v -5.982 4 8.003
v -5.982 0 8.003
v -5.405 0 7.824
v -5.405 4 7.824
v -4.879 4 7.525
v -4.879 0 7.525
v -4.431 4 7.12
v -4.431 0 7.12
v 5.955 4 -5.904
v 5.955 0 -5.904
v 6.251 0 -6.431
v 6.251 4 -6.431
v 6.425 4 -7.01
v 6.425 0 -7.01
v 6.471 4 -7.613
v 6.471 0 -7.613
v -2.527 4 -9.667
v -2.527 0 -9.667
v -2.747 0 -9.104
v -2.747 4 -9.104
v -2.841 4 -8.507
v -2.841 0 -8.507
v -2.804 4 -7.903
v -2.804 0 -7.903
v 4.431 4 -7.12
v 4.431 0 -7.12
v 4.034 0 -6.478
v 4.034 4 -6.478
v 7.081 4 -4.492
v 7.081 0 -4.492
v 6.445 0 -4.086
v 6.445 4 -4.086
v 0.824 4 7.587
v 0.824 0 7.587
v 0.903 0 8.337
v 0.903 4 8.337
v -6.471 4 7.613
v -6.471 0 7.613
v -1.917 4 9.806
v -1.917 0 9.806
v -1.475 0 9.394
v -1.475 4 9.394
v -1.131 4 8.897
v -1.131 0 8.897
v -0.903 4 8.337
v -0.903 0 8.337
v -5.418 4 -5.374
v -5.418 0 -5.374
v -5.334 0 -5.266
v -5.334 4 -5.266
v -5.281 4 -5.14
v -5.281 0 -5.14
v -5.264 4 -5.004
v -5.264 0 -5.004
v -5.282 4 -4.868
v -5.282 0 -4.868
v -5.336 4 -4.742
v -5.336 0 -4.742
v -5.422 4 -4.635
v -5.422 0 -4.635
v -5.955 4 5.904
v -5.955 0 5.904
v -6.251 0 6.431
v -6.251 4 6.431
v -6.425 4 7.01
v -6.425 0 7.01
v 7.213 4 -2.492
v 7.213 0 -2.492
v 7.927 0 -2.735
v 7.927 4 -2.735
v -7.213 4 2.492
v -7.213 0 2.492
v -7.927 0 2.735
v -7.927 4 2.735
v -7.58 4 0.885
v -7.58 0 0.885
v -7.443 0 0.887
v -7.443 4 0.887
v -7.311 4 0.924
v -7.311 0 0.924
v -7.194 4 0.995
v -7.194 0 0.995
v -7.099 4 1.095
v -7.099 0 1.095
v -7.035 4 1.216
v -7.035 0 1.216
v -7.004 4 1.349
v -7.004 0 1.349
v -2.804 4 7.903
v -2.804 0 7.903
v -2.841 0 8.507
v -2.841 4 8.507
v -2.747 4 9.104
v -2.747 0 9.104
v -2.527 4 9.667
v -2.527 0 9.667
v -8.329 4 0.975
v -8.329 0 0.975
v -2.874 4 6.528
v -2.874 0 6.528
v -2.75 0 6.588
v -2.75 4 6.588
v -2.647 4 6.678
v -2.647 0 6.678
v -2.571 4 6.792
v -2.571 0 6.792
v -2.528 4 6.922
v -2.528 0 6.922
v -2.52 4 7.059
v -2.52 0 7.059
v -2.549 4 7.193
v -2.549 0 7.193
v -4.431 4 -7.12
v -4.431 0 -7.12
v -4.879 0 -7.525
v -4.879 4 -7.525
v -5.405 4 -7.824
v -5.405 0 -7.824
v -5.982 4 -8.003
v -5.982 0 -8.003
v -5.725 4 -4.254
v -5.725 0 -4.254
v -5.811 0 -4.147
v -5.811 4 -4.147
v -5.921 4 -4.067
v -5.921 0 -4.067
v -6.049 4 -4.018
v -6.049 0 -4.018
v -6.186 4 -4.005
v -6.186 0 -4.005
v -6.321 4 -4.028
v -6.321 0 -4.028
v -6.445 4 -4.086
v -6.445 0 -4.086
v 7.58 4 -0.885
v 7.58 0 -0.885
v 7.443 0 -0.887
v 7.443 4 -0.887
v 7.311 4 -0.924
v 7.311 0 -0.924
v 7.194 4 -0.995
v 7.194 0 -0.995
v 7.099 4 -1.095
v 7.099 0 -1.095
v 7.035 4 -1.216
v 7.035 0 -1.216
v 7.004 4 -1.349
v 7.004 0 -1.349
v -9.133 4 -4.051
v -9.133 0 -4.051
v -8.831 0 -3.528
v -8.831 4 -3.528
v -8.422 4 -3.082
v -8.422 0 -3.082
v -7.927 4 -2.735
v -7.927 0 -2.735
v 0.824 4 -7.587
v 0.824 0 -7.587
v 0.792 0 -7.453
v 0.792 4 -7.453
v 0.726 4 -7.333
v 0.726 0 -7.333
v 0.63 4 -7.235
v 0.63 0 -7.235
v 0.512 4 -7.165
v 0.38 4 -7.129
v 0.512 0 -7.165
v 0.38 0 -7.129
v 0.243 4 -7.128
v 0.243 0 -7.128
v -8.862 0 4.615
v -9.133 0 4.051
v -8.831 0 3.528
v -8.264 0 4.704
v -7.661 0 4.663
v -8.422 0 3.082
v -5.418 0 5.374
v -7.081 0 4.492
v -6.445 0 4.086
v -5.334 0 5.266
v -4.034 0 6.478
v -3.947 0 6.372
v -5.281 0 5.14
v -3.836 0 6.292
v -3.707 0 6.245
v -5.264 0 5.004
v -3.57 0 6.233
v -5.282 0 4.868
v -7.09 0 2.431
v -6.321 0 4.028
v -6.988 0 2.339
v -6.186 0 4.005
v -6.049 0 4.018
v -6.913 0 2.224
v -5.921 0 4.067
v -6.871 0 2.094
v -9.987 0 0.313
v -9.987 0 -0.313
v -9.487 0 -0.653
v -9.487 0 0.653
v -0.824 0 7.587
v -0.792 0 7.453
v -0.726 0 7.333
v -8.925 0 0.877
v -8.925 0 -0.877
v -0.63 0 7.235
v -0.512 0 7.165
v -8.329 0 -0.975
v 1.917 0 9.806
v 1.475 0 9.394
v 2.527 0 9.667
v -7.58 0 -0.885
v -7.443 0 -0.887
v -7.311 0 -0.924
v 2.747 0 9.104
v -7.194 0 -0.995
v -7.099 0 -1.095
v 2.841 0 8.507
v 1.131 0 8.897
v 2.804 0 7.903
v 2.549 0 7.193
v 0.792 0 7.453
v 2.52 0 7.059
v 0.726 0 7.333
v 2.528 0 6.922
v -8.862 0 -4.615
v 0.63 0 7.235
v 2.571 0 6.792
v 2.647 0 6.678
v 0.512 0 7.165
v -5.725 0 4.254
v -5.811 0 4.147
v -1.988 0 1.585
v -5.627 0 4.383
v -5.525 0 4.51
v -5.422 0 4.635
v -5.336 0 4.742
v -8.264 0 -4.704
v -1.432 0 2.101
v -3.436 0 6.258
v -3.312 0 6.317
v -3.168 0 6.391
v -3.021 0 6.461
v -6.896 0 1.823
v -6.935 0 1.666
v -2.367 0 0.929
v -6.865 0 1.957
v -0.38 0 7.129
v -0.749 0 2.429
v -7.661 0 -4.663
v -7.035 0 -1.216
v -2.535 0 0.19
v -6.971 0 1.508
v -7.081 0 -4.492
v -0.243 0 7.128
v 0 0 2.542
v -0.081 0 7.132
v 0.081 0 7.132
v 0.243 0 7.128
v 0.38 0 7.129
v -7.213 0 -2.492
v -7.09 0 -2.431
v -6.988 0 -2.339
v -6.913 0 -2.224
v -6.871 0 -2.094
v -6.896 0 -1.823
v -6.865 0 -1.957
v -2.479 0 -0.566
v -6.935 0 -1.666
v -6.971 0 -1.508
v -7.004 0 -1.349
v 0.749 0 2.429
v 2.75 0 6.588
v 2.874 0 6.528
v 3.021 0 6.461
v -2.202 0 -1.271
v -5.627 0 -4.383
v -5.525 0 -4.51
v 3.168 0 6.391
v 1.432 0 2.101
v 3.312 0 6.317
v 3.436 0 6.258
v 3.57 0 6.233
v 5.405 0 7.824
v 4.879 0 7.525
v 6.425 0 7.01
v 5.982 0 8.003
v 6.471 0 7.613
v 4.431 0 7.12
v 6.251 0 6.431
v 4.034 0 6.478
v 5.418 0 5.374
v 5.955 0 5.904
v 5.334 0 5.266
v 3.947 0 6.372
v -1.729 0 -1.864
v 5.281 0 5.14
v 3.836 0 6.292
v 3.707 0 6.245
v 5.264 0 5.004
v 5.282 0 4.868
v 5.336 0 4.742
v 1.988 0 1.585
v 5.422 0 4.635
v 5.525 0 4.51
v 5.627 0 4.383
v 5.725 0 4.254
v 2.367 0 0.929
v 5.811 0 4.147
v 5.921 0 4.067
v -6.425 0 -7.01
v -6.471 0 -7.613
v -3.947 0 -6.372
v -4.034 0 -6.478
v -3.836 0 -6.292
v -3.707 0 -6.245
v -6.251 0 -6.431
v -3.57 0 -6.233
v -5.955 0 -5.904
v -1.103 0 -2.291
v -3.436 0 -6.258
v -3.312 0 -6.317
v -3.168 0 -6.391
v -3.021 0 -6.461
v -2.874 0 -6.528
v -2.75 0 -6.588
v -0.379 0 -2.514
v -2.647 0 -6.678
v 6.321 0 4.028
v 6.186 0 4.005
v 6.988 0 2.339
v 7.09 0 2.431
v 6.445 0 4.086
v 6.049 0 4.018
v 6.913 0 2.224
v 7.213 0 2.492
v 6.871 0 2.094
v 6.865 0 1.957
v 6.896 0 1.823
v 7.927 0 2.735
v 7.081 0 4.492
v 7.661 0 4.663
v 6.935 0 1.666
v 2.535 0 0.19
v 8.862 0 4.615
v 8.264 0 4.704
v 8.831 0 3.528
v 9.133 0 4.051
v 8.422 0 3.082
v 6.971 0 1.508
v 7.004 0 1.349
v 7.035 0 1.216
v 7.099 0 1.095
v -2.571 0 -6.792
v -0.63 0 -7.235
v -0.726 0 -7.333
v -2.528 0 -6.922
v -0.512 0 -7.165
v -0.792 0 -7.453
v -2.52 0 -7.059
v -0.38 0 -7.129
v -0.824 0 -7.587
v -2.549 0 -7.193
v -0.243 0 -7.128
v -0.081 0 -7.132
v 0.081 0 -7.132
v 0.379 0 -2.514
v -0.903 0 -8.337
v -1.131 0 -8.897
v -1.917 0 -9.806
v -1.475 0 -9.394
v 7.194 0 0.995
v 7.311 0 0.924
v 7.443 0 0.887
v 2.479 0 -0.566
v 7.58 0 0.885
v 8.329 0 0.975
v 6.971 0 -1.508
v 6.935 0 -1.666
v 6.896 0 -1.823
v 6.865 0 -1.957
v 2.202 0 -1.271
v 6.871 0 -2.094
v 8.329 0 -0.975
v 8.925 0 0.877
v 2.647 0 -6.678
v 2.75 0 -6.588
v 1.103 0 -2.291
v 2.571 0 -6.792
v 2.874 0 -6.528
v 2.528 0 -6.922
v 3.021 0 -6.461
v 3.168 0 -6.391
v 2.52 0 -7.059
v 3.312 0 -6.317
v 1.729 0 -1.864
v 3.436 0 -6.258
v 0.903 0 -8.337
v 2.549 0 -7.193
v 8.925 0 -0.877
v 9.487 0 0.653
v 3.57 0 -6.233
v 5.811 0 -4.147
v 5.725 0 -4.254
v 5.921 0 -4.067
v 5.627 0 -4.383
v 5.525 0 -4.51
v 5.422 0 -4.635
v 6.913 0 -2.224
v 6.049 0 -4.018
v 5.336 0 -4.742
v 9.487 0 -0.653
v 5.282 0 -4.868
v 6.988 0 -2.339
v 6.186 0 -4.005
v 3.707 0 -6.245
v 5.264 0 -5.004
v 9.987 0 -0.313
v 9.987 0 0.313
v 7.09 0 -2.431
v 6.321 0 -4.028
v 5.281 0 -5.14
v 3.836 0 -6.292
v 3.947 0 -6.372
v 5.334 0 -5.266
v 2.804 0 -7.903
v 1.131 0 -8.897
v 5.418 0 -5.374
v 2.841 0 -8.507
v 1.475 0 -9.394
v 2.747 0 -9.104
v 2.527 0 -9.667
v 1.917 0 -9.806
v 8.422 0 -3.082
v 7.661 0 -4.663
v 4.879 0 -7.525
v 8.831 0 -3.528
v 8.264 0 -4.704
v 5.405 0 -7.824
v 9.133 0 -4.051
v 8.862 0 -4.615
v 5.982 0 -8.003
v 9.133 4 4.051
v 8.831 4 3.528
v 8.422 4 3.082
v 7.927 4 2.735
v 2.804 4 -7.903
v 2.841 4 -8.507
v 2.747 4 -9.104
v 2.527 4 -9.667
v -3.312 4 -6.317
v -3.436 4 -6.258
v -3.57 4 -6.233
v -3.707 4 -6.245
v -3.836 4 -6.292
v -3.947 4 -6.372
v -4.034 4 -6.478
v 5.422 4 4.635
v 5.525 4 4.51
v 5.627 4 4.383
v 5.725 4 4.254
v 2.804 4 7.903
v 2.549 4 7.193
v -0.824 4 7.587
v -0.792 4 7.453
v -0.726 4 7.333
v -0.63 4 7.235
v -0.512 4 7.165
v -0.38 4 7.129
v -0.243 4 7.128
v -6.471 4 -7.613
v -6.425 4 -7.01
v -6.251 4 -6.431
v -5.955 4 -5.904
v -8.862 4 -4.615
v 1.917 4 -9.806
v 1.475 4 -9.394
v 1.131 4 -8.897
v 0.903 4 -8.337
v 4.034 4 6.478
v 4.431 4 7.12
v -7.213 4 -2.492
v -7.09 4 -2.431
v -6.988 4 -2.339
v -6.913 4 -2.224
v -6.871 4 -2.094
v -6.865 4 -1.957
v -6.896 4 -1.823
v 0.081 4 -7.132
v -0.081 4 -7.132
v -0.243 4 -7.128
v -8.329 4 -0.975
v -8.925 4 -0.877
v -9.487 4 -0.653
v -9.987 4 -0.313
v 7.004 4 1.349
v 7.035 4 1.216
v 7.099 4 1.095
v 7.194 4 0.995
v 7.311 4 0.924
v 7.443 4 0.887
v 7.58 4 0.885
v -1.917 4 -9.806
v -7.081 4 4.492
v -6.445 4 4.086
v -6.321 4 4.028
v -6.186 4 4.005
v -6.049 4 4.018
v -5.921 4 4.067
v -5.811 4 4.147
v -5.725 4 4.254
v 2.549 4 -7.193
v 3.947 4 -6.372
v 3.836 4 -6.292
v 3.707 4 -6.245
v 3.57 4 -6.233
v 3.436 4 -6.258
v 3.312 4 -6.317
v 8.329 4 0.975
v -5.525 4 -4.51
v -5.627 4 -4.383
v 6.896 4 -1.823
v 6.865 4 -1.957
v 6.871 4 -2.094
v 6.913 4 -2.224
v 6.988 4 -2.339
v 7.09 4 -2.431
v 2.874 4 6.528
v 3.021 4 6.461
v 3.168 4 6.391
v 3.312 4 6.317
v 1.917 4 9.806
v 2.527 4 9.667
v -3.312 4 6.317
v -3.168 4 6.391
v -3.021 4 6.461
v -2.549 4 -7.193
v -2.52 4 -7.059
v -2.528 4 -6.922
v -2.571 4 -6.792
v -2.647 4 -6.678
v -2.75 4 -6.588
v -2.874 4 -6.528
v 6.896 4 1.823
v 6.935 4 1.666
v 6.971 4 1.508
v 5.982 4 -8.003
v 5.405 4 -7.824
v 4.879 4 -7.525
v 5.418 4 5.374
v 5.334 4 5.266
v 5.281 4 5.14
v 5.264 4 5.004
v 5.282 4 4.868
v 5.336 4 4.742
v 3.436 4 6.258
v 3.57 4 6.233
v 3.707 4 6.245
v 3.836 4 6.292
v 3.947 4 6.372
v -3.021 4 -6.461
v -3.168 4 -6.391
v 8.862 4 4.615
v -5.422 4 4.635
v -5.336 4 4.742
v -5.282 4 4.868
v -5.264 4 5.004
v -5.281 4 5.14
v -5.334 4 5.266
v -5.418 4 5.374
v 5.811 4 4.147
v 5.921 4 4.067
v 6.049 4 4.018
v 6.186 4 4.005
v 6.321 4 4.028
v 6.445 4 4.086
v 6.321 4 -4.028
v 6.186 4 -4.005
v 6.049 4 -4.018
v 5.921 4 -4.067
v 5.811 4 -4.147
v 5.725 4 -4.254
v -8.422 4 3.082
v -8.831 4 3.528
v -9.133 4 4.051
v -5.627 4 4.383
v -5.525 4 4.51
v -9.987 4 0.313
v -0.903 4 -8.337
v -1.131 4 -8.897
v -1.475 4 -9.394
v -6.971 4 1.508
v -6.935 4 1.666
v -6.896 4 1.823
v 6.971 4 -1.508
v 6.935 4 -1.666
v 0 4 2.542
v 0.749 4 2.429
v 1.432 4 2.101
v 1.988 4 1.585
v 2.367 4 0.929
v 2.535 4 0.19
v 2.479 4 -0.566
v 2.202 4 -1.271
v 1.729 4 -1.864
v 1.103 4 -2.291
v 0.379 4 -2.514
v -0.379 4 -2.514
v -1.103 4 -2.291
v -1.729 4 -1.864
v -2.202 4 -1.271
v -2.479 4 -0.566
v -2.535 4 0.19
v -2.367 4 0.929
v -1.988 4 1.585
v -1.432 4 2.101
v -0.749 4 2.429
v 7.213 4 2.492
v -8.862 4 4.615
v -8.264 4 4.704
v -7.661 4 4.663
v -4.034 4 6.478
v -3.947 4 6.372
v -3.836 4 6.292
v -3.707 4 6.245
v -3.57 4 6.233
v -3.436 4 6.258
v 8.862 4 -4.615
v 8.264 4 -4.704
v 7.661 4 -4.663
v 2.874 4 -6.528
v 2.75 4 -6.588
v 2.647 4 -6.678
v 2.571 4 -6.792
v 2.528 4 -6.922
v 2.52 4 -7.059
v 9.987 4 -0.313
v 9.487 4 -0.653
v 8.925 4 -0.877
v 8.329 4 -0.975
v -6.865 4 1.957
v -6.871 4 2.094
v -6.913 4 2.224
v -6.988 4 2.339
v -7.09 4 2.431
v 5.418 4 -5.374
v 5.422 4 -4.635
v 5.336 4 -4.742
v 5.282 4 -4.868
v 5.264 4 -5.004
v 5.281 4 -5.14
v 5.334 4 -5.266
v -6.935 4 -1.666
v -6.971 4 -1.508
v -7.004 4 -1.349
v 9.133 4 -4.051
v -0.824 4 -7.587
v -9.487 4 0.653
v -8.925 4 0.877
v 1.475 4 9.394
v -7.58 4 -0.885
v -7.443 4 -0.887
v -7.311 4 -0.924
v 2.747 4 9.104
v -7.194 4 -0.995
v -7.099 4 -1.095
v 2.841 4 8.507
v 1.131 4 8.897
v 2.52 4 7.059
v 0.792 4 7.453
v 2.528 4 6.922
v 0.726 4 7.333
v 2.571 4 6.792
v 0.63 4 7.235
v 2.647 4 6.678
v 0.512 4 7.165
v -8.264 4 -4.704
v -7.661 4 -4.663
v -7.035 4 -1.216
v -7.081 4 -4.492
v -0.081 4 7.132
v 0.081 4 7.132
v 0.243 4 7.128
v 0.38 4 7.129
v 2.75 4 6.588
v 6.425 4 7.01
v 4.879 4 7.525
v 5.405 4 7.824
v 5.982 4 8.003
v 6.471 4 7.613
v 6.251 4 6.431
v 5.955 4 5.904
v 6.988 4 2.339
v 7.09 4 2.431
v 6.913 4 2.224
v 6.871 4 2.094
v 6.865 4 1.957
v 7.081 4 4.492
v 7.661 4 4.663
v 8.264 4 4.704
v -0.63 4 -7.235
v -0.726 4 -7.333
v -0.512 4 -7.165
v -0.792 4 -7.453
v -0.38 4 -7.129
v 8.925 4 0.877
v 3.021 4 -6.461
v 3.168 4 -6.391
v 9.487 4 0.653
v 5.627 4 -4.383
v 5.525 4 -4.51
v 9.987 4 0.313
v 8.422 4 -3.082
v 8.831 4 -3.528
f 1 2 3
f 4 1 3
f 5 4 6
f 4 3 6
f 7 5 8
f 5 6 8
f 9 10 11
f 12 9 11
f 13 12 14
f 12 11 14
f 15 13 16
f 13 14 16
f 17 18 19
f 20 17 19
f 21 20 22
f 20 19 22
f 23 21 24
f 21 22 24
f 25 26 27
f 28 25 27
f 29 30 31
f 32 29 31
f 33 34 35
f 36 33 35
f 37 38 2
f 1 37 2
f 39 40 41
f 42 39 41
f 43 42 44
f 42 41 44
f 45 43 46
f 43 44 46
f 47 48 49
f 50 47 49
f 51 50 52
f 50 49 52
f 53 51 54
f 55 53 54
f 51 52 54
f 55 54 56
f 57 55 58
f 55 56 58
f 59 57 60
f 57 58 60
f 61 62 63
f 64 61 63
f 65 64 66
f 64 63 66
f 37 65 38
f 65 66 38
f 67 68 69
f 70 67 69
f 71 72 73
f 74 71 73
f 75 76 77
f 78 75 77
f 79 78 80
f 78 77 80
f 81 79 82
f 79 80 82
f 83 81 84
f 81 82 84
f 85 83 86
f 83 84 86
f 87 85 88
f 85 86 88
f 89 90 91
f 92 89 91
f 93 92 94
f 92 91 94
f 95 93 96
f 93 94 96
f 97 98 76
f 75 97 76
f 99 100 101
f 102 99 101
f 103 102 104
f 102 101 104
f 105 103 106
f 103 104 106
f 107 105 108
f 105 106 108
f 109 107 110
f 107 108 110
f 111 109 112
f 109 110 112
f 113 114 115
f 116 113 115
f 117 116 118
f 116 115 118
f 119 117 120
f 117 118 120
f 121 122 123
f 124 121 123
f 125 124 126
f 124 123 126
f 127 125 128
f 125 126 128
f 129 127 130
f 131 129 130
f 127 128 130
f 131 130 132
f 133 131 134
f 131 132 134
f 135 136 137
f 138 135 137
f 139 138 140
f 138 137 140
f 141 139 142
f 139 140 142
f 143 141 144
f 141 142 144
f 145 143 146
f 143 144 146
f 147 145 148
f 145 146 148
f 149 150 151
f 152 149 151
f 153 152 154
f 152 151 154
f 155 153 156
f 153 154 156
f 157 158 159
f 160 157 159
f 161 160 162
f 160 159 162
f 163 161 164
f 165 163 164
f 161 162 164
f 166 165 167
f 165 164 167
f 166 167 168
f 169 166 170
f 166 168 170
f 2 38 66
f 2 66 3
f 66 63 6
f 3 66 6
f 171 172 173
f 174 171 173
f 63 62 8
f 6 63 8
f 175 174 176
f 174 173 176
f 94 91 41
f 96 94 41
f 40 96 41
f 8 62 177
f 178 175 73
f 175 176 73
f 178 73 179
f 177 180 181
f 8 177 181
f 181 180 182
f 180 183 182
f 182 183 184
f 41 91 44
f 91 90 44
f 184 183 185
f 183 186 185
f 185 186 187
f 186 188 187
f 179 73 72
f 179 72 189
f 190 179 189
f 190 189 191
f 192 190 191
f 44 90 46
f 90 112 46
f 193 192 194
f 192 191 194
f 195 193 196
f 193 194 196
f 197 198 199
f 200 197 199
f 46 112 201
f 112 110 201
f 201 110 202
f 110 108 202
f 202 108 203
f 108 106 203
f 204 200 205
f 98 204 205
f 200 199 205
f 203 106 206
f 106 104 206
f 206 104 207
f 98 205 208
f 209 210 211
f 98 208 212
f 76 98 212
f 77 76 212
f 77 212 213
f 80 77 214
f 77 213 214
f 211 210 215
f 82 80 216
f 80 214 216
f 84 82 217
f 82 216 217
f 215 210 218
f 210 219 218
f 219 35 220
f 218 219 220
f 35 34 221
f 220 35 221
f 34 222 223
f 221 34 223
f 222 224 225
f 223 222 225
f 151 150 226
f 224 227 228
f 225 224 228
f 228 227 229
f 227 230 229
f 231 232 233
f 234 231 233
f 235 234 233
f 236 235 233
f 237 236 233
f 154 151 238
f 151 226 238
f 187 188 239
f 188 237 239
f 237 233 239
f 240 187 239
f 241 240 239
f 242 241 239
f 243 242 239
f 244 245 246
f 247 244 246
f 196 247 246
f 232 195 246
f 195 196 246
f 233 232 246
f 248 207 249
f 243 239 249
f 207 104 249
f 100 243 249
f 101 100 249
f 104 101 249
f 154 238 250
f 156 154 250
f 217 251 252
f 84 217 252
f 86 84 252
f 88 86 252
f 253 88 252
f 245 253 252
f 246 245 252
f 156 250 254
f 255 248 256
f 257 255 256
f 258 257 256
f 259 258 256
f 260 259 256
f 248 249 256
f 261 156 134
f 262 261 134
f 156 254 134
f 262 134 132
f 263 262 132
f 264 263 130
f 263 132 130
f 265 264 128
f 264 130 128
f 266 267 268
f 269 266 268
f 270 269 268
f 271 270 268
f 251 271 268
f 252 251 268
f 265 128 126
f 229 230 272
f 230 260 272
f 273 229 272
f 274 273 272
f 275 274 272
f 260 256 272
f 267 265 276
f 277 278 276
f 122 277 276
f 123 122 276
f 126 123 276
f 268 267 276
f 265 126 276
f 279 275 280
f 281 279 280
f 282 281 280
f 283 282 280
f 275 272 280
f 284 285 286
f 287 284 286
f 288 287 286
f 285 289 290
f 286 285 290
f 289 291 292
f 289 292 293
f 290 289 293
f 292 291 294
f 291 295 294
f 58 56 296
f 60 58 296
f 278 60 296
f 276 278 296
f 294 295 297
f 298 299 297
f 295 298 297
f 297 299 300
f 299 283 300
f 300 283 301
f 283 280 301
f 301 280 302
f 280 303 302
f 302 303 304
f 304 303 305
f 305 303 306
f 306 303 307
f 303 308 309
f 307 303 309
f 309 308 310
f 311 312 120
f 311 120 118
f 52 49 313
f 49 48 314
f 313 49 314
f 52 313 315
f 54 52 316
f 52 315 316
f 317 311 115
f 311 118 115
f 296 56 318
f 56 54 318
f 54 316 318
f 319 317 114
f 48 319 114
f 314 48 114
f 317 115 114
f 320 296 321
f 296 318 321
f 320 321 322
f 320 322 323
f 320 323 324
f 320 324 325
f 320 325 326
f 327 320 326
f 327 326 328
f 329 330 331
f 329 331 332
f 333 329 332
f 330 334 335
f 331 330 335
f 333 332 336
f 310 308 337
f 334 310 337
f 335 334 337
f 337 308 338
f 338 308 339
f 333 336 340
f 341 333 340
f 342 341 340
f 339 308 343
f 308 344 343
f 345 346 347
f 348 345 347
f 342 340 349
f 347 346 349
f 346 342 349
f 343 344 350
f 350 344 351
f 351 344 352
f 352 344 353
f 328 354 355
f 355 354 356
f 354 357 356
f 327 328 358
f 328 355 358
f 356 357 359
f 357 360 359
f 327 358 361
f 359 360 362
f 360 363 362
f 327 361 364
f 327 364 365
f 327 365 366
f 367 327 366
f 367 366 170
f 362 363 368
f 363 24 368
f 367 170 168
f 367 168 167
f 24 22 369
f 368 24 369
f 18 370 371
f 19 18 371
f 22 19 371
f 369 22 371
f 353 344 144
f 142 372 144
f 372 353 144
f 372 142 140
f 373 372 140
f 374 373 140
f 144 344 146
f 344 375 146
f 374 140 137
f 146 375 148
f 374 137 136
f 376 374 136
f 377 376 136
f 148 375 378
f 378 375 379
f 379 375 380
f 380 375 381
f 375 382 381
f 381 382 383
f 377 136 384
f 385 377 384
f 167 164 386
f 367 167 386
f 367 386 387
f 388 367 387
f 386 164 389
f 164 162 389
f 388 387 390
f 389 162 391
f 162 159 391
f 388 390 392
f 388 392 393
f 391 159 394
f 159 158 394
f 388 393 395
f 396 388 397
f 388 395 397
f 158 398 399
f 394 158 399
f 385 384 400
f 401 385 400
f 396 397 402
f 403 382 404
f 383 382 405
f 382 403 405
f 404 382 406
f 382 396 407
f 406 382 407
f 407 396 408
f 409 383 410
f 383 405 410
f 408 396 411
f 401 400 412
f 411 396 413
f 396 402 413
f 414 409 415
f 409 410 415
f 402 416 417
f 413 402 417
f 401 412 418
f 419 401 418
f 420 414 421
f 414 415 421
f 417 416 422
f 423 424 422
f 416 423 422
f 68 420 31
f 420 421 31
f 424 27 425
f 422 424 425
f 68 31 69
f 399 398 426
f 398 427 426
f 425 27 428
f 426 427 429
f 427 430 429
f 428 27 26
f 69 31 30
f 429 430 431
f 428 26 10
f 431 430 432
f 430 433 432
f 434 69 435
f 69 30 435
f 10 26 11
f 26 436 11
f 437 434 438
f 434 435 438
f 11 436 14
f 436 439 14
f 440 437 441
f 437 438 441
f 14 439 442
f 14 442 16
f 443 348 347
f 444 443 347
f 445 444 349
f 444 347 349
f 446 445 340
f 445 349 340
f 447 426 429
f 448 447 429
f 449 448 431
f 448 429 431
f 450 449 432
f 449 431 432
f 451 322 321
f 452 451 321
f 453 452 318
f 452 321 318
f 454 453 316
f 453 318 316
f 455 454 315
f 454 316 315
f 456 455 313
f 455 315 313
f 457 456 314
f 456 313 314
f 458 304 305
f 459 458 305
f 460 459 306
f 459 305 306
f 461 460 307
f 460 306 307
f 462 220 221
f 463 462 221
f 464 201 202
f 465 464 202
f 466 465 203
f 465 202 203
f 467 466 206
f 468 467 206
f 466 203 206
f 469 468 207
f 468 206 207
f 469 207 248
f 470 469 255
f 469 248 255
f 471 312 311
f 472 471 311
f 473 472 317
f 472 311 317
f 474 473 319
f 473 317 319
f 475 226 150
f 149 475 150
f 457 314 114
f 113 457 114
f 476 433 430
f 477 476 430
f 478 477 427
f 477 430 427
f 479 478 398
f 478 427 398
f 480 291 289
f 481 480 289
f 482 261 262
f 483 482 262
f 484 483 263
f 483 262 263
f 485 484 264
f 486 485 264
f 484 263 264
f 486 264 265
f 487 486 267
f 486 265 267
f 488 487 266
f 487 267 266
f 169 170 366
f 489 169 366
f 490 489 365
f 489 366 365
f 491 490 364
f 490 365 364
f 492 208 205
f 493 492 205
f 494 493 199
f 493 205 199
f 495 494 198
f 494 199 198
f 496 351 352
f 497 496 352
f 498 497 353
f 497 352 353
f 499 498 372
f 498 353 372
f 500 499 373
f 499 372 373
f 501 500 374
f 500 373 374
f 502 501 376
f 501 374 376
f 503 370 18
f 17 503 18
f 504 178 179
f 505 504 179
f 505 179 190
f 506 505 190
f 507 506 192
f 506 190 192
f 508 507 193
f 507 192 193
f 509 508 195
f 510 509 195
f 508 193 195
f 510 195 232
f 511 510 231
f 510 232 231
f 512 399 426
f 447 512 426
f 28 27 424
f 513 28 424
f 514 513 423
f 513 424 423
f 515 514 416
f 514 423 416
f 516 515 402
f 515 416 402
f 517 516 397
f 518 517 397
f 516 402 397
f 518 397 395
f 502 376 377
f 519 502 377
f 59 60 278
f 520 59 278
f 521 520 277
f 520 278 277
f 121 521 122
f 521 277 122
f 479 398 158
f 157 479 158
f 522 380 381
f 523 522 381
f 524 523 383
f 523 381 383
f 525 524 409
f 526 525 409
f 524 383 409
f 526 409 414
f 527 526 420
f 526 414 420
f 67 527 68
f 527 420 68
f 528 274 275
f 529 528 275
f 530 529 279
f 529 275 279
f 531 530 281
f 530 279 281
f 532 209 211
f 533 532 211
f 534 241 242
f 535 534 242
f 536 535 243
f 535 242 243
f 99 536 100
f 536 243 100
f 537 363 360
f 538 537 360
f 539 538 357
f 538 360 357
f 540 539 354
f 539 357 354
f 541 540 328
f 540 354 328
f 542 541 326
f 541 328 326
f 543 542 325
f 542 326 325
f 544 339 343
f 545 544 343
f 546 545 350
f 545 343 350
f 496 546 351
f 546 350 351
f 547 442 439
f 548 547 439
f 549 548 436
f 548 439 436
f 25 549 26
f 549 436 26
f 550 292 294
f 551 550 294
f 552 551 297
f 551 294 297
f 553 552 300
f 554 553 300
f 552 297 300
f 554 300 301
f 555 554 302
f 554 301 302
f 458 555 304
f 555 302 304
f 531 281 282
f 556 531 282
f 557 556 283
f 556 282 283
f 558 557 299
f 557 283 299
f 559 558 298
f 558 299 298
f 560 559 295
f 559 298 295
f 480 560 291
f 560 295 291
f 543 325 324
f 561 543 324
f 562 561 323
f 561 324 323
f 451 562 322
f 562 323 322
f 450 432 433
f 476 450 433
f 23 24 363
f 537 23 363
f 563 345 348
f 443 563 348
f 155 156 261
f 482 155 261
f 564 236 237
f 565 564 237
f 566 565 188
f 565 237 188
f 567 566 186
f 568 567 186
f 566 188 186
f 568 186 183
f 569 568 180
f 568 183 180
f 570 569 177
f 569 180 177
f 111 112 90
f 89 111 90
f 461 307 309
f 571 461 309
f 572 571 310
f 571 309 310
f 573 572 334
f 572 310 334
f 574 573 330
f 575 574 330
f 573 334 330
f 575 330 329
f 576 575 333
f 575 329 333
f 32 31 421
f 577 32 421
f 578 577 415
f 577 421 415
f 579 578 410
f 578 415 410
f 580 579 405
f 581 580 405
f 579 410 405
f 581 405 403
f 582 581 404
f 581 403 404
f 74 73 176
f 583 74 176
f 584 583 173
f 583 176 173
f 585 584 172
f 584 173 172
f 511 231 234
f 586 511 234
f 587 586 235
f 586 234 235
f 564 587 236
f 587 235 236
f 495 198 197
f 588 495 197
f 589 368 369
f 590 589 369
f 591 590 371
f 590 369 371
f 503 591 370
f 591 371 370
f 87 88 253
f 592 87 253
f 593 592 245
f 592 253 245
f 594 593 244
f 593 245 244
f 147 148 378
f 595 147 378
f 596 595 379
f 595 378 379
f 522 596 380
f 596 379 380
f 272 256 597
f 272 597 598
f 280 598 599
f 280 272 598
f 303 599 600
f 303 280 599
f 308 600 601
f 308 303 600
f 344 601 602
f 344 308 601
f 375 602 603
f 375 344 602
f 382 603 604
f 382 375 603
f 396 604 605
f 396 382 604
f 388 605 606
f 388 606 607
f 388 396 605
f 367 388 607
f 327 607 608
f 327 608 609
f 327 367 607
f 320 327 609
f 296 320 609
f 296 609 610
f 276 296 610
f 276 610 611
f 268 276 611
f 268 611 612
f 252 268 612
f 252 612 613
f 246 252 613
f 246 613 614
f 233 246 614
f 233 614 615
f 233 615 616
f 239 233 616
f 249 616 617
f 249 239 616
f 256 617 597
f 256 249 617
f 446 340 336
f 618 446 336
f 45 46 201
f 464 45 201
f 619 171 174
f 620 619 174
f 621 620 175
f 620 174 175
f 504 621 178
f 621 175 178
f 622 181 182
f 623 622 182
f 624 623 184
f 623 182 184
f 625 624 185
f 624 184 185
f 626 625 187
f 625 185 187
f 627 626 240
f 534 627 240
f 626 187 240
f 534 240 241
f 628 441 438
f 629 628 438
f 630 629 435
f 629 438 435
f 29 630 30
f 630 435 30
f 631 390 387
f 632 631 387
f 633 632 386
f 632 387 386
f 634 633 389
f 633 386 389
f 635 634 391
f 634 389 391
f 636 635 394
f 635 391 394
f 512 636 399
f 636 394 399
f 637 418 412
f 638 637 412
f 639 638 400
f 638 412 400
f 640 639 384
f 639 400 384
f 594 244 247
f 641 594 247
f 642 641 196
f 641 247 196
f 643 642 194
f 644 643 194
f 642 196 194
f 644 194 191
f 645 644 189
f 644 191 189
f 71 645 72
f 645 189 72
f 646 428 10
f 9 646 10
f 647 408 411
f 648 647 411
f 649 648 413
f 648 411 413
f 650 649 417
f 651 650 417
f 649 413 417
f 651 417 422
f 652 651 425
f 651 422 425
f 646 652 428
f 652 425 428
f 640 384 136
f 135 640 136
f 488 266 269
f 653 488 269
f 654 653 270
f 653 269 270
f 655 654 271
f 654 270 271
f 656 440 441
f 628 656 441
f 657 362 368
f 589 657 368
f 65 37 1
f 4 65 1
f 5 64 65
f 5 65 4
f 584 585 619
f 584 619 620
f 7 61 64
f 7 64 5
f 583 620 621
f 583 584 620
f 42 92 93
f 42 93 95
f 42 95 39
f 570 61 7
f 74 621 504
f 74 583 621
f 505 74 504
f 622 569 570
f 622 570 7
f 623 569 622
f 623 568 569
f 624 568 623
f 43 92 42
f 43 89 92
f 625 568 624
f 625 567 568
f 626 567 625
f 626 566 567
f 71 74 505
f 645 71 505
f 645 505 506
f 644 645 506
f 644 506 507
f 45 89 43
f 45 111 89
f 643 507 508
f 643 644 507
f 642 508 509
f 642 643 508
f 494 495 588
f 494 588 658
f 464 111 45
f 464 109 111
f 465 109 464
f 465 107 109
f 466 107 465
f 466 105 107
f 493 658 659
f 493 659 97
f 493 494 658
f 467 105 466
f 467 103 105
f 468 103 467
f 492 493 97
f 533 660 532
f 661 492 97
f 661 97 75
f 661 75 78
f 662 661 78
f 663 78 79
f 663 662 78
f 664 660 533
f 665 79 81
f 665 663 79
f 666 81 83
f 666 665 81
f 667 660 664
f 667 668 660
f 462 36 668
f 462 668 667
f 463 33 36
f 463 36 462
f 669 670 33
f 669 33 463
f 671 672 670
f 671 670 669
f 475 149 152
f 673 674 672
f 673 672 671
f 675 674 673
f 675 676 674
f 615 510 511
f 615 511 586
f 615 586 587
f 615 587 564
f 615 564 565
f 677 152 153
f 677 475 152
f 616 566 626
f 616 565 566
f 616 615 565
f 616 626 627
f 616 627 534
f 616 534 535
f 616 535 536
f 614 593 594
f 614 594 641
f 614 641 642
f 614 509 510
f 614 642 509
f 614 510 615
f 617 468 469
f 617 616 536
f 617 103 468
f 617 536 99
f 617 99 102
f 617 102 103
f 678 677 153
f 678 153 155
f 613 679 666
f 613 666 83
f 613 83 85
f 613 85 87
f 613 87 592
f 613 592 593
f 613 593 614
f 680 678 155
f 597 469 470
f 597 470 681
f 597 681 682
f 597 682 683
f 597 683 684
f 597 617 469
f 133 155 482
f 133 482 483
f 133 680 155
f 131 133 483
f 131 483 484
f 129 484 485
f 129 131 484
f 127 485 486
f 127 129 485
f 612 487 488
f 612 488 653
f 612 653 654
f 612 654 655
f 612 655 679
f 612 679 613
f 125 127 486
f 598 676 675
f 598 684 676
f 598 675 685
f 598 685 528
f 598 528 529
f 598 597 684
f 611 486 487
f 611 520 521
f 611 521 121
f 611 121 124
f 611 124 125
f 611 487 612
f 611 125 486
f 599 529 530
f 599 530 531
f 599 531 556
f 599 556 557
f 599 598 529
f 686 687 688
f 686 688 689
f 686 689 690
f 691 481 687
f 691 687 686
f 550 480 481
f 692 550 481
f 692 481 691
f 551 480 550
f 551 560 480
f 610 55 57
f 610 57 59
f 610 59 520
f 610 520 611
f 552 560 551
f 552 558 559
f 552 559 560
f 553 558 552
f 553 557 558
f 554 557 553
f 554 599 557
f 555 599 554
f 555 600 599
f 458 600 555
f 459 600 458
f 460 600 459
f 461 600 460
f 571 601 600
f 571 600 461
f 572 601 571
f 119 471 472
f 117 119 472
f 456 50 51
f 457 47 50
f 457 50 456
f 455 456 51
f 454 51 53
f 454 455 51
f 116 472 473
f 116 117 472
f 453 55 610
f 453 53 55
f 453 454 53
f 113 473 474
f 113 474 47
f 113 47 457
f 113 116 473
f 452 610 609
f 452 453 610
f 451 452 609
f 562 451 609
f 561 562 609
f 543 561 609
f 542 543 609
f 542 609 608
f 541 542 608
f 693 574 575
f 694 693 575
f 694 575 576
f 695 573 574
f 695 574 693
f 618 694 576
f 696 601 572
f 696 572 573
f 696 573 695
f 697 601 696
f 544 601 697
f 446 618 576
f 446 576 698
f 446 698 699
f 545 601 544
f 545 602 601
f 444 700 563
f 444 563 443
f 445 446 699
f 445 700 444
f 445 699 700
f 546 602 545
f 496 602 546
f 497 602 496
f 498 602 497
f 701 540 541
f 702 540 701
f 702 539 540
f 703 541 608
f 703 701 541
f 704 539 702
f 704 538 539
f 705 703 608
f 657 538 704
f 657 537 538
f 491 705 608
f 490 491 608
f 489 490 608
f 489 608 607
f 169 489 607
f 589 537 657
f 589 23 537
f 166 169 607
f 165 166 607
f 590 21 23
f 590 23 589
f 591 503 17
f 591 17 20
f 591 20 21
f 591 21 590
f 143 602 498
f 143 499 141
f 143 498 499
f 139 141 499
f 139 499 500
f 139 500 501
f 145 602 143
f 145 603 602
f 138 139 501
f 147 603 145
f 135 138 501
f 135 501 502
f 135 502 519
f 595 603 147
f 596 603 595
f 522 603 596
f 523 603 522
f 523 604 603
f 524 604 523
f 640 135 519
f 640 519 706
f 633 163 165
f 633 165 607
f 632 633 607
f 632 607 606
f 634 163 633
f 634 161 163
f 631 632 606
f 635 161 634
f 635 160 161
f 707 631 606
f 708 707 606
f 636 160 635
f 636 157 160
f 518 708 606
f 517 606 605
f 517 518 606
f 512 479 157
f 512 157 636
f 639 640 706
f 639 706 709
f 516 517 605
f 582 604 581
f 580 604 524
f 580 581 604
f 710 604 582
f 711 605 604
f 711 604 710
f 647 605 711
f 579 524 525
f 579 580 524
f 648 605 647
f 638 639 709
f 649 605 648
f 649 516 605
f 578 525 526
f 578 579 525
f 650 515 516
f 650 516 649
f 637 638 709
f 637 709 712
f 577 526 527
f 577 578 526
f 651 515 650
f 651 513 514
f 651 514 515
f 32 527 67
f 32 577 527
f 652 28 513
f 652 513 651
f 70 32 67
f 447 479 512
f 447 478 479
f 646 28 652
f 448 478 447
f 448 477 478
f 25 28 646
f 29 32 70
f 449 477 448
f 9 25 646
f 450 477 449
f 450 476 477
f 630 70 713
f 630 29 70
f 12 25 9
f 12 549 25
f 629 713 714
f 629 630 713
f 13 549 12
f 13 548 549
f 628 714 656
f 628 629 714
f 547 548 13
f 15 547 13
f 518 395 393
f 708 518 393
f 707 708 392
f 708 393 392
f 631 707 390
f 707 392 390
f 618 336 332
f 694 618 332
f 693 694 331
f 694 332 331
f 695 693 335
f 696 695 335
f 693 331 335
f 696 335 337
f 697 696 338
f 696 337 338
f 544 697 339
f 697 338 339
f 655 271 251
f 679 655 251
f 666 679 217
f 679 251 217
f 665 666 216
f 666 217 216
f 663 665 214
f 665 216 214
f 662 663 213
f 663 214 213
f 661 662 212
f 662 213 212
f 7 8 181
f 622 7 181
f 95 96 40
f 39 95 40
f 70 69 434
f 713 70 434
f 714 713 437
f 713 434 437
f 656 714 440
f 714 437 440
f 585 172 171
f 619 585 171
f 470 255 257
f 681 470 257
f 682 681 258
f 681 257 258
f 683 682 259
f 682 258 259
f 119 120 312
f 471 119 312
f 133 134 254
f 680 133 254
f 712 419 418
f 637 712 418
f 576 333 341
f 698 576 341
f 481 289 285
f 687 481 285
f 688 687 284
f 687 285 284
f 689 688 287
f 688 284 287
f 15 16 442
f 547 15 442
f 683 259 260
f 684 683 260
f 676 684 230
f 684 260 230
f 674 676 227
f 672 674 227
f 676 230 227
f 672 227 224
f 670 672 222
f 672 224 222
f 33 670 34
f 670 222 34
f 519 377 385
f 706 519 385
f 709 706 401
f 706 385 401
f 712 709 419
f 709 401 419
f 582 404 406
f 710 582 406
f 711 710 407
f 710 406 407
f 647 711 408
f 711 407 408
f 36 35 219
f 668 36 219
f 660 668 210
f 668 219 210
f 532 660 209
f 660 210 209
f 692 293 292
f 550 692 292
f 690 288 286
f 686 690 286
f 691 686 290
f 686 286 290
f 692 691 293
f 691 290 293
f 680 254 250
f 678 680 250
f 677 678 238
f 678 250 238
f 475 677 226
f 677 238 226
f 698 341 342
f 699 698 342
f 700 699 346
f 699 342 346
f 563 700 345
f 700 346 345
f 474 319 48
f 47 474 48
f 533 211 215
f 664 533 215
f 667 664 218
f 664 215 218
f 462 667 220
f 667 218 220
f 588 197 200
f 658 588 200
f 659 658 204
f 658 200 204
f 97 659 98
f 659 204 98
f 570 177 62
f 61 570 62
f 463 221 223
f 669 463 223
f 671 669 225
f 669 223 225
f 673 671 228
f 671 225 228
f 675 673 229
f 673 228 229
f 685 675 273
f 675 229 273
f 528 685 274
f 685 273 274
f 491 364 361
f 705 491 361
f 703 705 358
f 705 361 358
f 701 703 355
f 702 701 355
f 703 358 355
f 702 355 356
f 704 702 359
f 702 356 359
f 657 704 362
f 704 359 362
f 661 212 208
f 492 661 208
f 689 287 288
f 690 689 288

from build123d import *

# Parameters (mm, degrees)
SKETCH1_R           = 2.542419914
BOSS_EXTRUDE1_DEPTH = 3.999992


with BuildPart() as part:
    # Sketch1 → Boss-Extrude1 (new body)
    with BuildSketch(Plane(origin=(0, 0, 0), x_dir=(1, 0, 0), z_dir=(0, 1, 0))):
        with BuildLine():
            Line((-7.927115113, 2.735422797), (-7.212976361, 2.491621041))
            ThreePointArc((-7.212976361, 2.491621041), (-6.913293064, 2.224424018), (-6.895509083, 1.823315483))
            ThreePointArc((-6.895509083, 1.823315483), (-6.953671189, 1.587130072), (-7.003745952, 1.349098778))
            ThreePointArc((-7.003745952, 1.349098778), (-7.193803236, 0.995428655), (-7.579741, 0.884720165))
            Line((-7.579741, 0.884720165), (-8.3289394, 0.974915565))
            ThreePointArc((-8.3289394, 0.974915565), (-9.212212433, 0.780173764), (-9.9866958, 0.3129788))
            Line((-9.9866958, 0.3129788), (-9.9866958, -0.3129788))
            ThreePointArc((-9.9866958, -0.3129788), (-9.212212433, -0.780173764), (-8.3289394, -0.974915565))
            Line((-8.3289394, -0.974915565), (-7.579741, -0.884720165))
            ThreePointArc((-7.579741, -0.884720165), (-7.193803236, -0.995428655), (-7.003745952, -1.349098778))
            ThreePointArc((-7.003745952, -1.349098778), (-6.953671189, -1.587130072), (-6.895509083, -1.823315483))
            ThreePointArc((-6.895509083, -1.823315483), (-6.913293064, -2.224424018), (-7.212976361, -2.491621041))
            Line((-7.212976361, -2.491621041), (-7.927115113, -2.735422797))
            ThreePointArc((-7.927115113, -2.735422797), (-8.638421316, -3.294116903), (-9.133498421, -4.05108076))
            Line((-9.133498421, -4.05108076), (-8.861905597, -4.61504907))
            ThreePointArc((-8.861905597, -4.61504907), (-7.961411897, -4.699941449), (-7.081115091, -4.492159943))
            Line((-7.081115091, -4.492159943), (-6.445244975, -4.085831692))
            ThreePointArc((-6.445244975, -4.085831692), (-6.049492451, -4.018124475), (-5.724805039, -4.25430748))
            ThreePointArc((-5.724805039, -4.25430748), (-5.576411329, -4.44703964), (-5.421532073, -4.63459975))
            ThreePointArc((-5.421532073, -4.63459975), (-5.263520415, -5.003702234), (-5.417593292, -5.374466142))
            Line((-5.417593292, -5.374466142), (-5.955228458, -5.903977126))
            ThreePointArc((-5.955228458, -5.903977126), (-6.353684915, -6.715967318), (-6.471299665, -7.612774092))
            Line((-6.471299665, -7.612774092), (-5.981906306, -8.003052272))
            ThreePointArc((-5.981906306, -8.003052272), (-5.133756094, -7.688828089), (-4.430789095, -7.119676951))
            Line((-4.430789095, -7.119676951), (-4.034189136, -6.477694143))
            ThreePointArc((-4.034189136, -6.477694143), (-3.707005493, -6.244981464), (-3.311996278, -6.31689841))
            ThreePointArc((-3.311996278, -6.31689841), (-3.094674815, -6.426158468), (-2.873754145, -6.527944698))
            ThreePointArc((-2.873754145, -6.527944698), (-2.571242995, -6.791935856), (-2.54918943, -7.192832311))
            Line((-2.54918943, -7.192832311), (-2.80383577, -7.903176378))
            ThreePointArc((-2.80383577, -7.903176378), (-2.810523293, -8.807638039), (-2.527380645, -9.666664151))
            Line((-2.527380645, -9.666664151), (-1.917117109, -9.805952821))
            ThreePointArc((-1.917117109, -9.805952821), (-1.289296936, -9.154848028), (-0.902890978, -8.337054622))
            Line((-0.902890978, -8.337054622), (-0.824112663, -7.586569825))
            ThreePointArc((-0.824112663, -7.586569825), (-0.630300635, -7.234943284), (-0.243206036, -7.128350138))
            ThreePointArc((-0.243206036, -7.128350138), (0, -7.1324978), (0.243206036, -7.128350138))
            ThreePointArc((0.243206036, -7.128350138), (0.630300635, -7.234943284), (0.824112663, -7.586569825))
            Line((0.824112663, -7.586569825), (0.902890978, -8.337054622))
            ThreePointArc((0.902890978, -8.337054622), (1.289296936, -9.154848028), (1.917117109, -9.805952821))
            Line((1.917117109, -9.805952821), (2.527380645, -9.666664151))
            ThreePointArc((2.527380645, -9.666664151), (2.810523293, -8.807638039), (2.80383577, -7.903176378))
            Line((2.80383577, -7.903176378), (2.54918943, -7.192832311))
            ThreePointArc((2.54918943, -7.192832311), (2.571242995, -6.791935856), (2.873754145, -6.527944698))
            ThreePointArc((2.873754145, -6.527944698), (3.094674815, -6.426158468), (3.311996278, -6.31689841))
            ThreePointArc((3.311996278, -6.31689841), (3.707005493, -6.244981464), (4.034189136, -6.477694143))
            Line((4.034189136, -6.477694143), (4.430789095, -7.119676951))
            ThreePointArc((4.430789095, -7.119676951), (5.133756094, -7.688828089), (5.981906306, -8.003052272))
            Line((5.981906306, -8.003052272), (6.471299665, -7.612774092))
            ThreePointArc((6.471299665, -7.612774092), (6.353684915, -6.715967318), (5.955228458, -5.903977126))
            Line((5.955228458, -5.903977126), (5.417593292, -5.374466142))
            ThreePointArc((5.417593292, -5.374466142), (5.263520415, -5.003702234), (5.421532073, -4.63459975))
            ThreePointArc((5.421532073, -4.63459975), (5.576411329, -4.44703964), (5.724805039, -4.25430748))
            ThreePointArc((5.724805039, -4.25430748), (6.049492451, -4.018124475), (6.445244975, -4.085831692))
            Line((6.445244975, -4.085831692), (7.081115091, -4.492159943))
            ThreePointArc((7.081115091, -4.492159943), (7.961411897, -4.699941449), (8.861905597, -4.61504907))
            Line((8.861905597, -4.61504907), (9.133498421, -4.05108076))
            ThreePointArc((9.133498421, -4.05108076), (8.638421316, -3.294116903), (7.927115113, -2.735422797))
            Line((7.927115113, -2.735422797), (7.212976361, -2.491621041))
            ThreePointArc((7.212976361, -2.491621041), (6.913293064, -2.224424018), (6.895509083, -1.823315483))
            ThreePointArc((6.895509083, -1.823315483), (6.953671189, -1.587130072), (7.003745952, -1.349098778))
            ThreePointArc((7.003745952, -1.349098778), (7.193803236, -0.995428655), (7.579741, -0.884720165))
            Line((7.579741, -0.884720165), (8.3289394, -0.974915565))
            ThreePointArc((8.3289394, -0.974915565), (9.212212433, -0.780173764), (9.9866958, -0.3129788))
            Line((9.9866958, -0.3129788), (9.9866958, 0.3129788))
            ThreePointArc((9.9866958, 0.3129788), (9.212212433, 0.780173764), (8.3289394, 0.974915565))
            Line((8.3289394, 0.974915565), (7.579741, 0.884720165))
            ThreePointArc((7.579741, 0.884720165), (7.193803236, 0.995428655), (7.003745952, 1.349098778))
            ThreePointArc((7.003745952, 1.349098778), (6.953671189, 1.587130072), (6.895509083, 1.823315483))
            ThreePointArc((6.895509083, 1.823315483), (6.913293064, 2.224424018), (7.212976361, 2.491621041))
            Line((7.212976361, 2.491621041), (7.927115113, 2.735422797))
            ThreePointArc((7.927115113, 2.735422797), (8.638421316, 3.294116903), (9.133498421, 4.05108076))
            Line((9.133498421, 4.05108076), (8.861905597, 4.61504907))
            ThreePointArc((8.861905597, 4.61504907), (7.961411897, 4.699941449), (7.081115091, 4.492159943))
            Line((7.081115091, 4.492159943), (6.445244975, 4.085831692))
            ThreePointArc((6.445244975, 4.085831692), (6.049492451, 4.018124475), (5.724805039, 4.25430748))
            ThreePointArc((5.724805039, 4.25430748), (5.576411329, 4.44703964), (5.421532073, 4.63459975))
            ThreePointArc((5.421532073, 4.63459975), (5.263520415, 5.003702234), (5.417593292, 5.374466142))
            Line((5.417593292, 5.374466142), (5.955228458, 5.903977126))
            ThreePointArc((5.955228458, 5.903977126), (6.353684915, 6.715967318), (6.471299665, 7.612774092))
            Line((6.471299665, 7.612774092), (5.981906306, 8.003052272))
            ThreePointArc((5.981906306, 8.003052272), (5.133756094, 7.688828089), (4.430789095, 7.119676951))
            Line((4.430789095, 7.119676951), (4.034189136, 6.477694143))
            ThreePointArc((4.034189136, 6.477694143), (3.707005493, 6.244981464), (3.311996278, 6.31689841))
            ThreePointArc((3.311996278, 6.31689841), (3.094674815, 6.426158468), (2.873754145, 6.527944698))
            ThreePointArc((2.873754145, 6.527944698), (2.571242995, 6.791935856), (2.54918943, 7.192832311))
            Line((2.54918943, 7.192832311), (2.80383577, 7.903176378))
            ThreePointArc((2.80383577, 7.903176378), (2.810523293, 8.807638039), (2.527380645, 9.666664151))
            Line((2.527380645, 9.666664151), (1.917117109, 9.805952821))
            ThreePointArc((1.917117109, 9.805952821), (1.289296936, 9.154848028), (0.902890978, 8.337054622))
            Line((0.902890978, 8.337054622), (0.824112663, 7.586569825))
            ThreePointArc((0.824112663, 7.586569825), (0.630300635, 7.234943284), (0.243206036, 7.128350138))
            ThreePointArc((0.243206036, 7.128350138), (0, 7.1324978), (-0.243206036, 7.128350138))
            ThreePointArc((-0.243206036, 7.128350138), (-0.630300635, 7.234943284), (-0.824112663, 7.586569825))
            Line((-0.824112663, 7.586569825), (-0.902890978, 8.337054622))
            ThreePointArc((-0.902890978, 8.337054622), (-1.289296936, 9.154848028), (-1.917117109, 9.805952821))
            Line((-1.917117109, 9.805952821), (-2.527380645, 9.666664151))
            ThreePointArc((-2.527380645, 9.666664151), (-2.810523293, 8.807638039), (-2.80383577, 7.903176378))
            Line((-2.80383577, 7.903176378), (-2.54918943, 7.192832311))
            ThreePointArc((-2.54918943, 7.192832311), (-2.571242995, 6.791935856), (-2.873754145, 6.527944698))
            ThreePointArc((-2.873754145, 6.527944698), (-3.094674815, 6.426158468), (-3.311996278, 6.31689841))
            ThreePointArc((-3.311996278, 6.31689841), (-3.707005493, 6.244981464), (-4.034189136, 6.477694143))
            Line((-4.034189136, 6.477694143), (-4.430789095, 7.119676951))
            ThreePointArc((-4.430789095, 7.119676951), (-5.133756094, 7.688828089), (-5.981906306, 8.003052272))
            Line((-5.981906306, 8.003052272), (-6.471299665, 7.612774092))
            ThreePointArc((-6.471299665, 7.612774092), (-6.353684915, 6.715967318), (-5.955228458, 5.903977126))
            Line((-5.955228458, 5.903977126), (-5.417593292, 5.374466142))
            ThreePointArc((-5.417593292, 5.374466142), (-5.263520415, 5.003702234), (-5.421532073, 4.63459975))
            ThreePointArc((-5.421532073, 4.63459975), (-5.576411329, 4.44703964), (-5.724805039, 4.25430748))
            ThreePointArc((-5.724805039, 4.25430748), (-6.049492451, 4.018124475), (-6.445244975, 4.085831692))
            Line((-6.445244975, 4.085831692), (-7.081115091, 4.492159943))
            ThreePointArc((-7.081115091, 4.492159943), (-7.961411897, 4.699941449), (-8.861905597, 4.61504907))
            Line((-8.861905597, 4.61504907), (-9.133498421, 4.05108076))
            ThreePointArc((-9.133498421, 4.05108076), (-8.638421316, 3.294116903), (-7.927115113, 2.735422797))
        make_face()
        with Locations(Location((0, 0, 0), (0, 0, 270))):
            Circle(SKETCH1_R, mode=Mode.SUBTRACT)
    extrude(amount=BOSS_EXTRUDE1_DEPTH)


solid = part.part
